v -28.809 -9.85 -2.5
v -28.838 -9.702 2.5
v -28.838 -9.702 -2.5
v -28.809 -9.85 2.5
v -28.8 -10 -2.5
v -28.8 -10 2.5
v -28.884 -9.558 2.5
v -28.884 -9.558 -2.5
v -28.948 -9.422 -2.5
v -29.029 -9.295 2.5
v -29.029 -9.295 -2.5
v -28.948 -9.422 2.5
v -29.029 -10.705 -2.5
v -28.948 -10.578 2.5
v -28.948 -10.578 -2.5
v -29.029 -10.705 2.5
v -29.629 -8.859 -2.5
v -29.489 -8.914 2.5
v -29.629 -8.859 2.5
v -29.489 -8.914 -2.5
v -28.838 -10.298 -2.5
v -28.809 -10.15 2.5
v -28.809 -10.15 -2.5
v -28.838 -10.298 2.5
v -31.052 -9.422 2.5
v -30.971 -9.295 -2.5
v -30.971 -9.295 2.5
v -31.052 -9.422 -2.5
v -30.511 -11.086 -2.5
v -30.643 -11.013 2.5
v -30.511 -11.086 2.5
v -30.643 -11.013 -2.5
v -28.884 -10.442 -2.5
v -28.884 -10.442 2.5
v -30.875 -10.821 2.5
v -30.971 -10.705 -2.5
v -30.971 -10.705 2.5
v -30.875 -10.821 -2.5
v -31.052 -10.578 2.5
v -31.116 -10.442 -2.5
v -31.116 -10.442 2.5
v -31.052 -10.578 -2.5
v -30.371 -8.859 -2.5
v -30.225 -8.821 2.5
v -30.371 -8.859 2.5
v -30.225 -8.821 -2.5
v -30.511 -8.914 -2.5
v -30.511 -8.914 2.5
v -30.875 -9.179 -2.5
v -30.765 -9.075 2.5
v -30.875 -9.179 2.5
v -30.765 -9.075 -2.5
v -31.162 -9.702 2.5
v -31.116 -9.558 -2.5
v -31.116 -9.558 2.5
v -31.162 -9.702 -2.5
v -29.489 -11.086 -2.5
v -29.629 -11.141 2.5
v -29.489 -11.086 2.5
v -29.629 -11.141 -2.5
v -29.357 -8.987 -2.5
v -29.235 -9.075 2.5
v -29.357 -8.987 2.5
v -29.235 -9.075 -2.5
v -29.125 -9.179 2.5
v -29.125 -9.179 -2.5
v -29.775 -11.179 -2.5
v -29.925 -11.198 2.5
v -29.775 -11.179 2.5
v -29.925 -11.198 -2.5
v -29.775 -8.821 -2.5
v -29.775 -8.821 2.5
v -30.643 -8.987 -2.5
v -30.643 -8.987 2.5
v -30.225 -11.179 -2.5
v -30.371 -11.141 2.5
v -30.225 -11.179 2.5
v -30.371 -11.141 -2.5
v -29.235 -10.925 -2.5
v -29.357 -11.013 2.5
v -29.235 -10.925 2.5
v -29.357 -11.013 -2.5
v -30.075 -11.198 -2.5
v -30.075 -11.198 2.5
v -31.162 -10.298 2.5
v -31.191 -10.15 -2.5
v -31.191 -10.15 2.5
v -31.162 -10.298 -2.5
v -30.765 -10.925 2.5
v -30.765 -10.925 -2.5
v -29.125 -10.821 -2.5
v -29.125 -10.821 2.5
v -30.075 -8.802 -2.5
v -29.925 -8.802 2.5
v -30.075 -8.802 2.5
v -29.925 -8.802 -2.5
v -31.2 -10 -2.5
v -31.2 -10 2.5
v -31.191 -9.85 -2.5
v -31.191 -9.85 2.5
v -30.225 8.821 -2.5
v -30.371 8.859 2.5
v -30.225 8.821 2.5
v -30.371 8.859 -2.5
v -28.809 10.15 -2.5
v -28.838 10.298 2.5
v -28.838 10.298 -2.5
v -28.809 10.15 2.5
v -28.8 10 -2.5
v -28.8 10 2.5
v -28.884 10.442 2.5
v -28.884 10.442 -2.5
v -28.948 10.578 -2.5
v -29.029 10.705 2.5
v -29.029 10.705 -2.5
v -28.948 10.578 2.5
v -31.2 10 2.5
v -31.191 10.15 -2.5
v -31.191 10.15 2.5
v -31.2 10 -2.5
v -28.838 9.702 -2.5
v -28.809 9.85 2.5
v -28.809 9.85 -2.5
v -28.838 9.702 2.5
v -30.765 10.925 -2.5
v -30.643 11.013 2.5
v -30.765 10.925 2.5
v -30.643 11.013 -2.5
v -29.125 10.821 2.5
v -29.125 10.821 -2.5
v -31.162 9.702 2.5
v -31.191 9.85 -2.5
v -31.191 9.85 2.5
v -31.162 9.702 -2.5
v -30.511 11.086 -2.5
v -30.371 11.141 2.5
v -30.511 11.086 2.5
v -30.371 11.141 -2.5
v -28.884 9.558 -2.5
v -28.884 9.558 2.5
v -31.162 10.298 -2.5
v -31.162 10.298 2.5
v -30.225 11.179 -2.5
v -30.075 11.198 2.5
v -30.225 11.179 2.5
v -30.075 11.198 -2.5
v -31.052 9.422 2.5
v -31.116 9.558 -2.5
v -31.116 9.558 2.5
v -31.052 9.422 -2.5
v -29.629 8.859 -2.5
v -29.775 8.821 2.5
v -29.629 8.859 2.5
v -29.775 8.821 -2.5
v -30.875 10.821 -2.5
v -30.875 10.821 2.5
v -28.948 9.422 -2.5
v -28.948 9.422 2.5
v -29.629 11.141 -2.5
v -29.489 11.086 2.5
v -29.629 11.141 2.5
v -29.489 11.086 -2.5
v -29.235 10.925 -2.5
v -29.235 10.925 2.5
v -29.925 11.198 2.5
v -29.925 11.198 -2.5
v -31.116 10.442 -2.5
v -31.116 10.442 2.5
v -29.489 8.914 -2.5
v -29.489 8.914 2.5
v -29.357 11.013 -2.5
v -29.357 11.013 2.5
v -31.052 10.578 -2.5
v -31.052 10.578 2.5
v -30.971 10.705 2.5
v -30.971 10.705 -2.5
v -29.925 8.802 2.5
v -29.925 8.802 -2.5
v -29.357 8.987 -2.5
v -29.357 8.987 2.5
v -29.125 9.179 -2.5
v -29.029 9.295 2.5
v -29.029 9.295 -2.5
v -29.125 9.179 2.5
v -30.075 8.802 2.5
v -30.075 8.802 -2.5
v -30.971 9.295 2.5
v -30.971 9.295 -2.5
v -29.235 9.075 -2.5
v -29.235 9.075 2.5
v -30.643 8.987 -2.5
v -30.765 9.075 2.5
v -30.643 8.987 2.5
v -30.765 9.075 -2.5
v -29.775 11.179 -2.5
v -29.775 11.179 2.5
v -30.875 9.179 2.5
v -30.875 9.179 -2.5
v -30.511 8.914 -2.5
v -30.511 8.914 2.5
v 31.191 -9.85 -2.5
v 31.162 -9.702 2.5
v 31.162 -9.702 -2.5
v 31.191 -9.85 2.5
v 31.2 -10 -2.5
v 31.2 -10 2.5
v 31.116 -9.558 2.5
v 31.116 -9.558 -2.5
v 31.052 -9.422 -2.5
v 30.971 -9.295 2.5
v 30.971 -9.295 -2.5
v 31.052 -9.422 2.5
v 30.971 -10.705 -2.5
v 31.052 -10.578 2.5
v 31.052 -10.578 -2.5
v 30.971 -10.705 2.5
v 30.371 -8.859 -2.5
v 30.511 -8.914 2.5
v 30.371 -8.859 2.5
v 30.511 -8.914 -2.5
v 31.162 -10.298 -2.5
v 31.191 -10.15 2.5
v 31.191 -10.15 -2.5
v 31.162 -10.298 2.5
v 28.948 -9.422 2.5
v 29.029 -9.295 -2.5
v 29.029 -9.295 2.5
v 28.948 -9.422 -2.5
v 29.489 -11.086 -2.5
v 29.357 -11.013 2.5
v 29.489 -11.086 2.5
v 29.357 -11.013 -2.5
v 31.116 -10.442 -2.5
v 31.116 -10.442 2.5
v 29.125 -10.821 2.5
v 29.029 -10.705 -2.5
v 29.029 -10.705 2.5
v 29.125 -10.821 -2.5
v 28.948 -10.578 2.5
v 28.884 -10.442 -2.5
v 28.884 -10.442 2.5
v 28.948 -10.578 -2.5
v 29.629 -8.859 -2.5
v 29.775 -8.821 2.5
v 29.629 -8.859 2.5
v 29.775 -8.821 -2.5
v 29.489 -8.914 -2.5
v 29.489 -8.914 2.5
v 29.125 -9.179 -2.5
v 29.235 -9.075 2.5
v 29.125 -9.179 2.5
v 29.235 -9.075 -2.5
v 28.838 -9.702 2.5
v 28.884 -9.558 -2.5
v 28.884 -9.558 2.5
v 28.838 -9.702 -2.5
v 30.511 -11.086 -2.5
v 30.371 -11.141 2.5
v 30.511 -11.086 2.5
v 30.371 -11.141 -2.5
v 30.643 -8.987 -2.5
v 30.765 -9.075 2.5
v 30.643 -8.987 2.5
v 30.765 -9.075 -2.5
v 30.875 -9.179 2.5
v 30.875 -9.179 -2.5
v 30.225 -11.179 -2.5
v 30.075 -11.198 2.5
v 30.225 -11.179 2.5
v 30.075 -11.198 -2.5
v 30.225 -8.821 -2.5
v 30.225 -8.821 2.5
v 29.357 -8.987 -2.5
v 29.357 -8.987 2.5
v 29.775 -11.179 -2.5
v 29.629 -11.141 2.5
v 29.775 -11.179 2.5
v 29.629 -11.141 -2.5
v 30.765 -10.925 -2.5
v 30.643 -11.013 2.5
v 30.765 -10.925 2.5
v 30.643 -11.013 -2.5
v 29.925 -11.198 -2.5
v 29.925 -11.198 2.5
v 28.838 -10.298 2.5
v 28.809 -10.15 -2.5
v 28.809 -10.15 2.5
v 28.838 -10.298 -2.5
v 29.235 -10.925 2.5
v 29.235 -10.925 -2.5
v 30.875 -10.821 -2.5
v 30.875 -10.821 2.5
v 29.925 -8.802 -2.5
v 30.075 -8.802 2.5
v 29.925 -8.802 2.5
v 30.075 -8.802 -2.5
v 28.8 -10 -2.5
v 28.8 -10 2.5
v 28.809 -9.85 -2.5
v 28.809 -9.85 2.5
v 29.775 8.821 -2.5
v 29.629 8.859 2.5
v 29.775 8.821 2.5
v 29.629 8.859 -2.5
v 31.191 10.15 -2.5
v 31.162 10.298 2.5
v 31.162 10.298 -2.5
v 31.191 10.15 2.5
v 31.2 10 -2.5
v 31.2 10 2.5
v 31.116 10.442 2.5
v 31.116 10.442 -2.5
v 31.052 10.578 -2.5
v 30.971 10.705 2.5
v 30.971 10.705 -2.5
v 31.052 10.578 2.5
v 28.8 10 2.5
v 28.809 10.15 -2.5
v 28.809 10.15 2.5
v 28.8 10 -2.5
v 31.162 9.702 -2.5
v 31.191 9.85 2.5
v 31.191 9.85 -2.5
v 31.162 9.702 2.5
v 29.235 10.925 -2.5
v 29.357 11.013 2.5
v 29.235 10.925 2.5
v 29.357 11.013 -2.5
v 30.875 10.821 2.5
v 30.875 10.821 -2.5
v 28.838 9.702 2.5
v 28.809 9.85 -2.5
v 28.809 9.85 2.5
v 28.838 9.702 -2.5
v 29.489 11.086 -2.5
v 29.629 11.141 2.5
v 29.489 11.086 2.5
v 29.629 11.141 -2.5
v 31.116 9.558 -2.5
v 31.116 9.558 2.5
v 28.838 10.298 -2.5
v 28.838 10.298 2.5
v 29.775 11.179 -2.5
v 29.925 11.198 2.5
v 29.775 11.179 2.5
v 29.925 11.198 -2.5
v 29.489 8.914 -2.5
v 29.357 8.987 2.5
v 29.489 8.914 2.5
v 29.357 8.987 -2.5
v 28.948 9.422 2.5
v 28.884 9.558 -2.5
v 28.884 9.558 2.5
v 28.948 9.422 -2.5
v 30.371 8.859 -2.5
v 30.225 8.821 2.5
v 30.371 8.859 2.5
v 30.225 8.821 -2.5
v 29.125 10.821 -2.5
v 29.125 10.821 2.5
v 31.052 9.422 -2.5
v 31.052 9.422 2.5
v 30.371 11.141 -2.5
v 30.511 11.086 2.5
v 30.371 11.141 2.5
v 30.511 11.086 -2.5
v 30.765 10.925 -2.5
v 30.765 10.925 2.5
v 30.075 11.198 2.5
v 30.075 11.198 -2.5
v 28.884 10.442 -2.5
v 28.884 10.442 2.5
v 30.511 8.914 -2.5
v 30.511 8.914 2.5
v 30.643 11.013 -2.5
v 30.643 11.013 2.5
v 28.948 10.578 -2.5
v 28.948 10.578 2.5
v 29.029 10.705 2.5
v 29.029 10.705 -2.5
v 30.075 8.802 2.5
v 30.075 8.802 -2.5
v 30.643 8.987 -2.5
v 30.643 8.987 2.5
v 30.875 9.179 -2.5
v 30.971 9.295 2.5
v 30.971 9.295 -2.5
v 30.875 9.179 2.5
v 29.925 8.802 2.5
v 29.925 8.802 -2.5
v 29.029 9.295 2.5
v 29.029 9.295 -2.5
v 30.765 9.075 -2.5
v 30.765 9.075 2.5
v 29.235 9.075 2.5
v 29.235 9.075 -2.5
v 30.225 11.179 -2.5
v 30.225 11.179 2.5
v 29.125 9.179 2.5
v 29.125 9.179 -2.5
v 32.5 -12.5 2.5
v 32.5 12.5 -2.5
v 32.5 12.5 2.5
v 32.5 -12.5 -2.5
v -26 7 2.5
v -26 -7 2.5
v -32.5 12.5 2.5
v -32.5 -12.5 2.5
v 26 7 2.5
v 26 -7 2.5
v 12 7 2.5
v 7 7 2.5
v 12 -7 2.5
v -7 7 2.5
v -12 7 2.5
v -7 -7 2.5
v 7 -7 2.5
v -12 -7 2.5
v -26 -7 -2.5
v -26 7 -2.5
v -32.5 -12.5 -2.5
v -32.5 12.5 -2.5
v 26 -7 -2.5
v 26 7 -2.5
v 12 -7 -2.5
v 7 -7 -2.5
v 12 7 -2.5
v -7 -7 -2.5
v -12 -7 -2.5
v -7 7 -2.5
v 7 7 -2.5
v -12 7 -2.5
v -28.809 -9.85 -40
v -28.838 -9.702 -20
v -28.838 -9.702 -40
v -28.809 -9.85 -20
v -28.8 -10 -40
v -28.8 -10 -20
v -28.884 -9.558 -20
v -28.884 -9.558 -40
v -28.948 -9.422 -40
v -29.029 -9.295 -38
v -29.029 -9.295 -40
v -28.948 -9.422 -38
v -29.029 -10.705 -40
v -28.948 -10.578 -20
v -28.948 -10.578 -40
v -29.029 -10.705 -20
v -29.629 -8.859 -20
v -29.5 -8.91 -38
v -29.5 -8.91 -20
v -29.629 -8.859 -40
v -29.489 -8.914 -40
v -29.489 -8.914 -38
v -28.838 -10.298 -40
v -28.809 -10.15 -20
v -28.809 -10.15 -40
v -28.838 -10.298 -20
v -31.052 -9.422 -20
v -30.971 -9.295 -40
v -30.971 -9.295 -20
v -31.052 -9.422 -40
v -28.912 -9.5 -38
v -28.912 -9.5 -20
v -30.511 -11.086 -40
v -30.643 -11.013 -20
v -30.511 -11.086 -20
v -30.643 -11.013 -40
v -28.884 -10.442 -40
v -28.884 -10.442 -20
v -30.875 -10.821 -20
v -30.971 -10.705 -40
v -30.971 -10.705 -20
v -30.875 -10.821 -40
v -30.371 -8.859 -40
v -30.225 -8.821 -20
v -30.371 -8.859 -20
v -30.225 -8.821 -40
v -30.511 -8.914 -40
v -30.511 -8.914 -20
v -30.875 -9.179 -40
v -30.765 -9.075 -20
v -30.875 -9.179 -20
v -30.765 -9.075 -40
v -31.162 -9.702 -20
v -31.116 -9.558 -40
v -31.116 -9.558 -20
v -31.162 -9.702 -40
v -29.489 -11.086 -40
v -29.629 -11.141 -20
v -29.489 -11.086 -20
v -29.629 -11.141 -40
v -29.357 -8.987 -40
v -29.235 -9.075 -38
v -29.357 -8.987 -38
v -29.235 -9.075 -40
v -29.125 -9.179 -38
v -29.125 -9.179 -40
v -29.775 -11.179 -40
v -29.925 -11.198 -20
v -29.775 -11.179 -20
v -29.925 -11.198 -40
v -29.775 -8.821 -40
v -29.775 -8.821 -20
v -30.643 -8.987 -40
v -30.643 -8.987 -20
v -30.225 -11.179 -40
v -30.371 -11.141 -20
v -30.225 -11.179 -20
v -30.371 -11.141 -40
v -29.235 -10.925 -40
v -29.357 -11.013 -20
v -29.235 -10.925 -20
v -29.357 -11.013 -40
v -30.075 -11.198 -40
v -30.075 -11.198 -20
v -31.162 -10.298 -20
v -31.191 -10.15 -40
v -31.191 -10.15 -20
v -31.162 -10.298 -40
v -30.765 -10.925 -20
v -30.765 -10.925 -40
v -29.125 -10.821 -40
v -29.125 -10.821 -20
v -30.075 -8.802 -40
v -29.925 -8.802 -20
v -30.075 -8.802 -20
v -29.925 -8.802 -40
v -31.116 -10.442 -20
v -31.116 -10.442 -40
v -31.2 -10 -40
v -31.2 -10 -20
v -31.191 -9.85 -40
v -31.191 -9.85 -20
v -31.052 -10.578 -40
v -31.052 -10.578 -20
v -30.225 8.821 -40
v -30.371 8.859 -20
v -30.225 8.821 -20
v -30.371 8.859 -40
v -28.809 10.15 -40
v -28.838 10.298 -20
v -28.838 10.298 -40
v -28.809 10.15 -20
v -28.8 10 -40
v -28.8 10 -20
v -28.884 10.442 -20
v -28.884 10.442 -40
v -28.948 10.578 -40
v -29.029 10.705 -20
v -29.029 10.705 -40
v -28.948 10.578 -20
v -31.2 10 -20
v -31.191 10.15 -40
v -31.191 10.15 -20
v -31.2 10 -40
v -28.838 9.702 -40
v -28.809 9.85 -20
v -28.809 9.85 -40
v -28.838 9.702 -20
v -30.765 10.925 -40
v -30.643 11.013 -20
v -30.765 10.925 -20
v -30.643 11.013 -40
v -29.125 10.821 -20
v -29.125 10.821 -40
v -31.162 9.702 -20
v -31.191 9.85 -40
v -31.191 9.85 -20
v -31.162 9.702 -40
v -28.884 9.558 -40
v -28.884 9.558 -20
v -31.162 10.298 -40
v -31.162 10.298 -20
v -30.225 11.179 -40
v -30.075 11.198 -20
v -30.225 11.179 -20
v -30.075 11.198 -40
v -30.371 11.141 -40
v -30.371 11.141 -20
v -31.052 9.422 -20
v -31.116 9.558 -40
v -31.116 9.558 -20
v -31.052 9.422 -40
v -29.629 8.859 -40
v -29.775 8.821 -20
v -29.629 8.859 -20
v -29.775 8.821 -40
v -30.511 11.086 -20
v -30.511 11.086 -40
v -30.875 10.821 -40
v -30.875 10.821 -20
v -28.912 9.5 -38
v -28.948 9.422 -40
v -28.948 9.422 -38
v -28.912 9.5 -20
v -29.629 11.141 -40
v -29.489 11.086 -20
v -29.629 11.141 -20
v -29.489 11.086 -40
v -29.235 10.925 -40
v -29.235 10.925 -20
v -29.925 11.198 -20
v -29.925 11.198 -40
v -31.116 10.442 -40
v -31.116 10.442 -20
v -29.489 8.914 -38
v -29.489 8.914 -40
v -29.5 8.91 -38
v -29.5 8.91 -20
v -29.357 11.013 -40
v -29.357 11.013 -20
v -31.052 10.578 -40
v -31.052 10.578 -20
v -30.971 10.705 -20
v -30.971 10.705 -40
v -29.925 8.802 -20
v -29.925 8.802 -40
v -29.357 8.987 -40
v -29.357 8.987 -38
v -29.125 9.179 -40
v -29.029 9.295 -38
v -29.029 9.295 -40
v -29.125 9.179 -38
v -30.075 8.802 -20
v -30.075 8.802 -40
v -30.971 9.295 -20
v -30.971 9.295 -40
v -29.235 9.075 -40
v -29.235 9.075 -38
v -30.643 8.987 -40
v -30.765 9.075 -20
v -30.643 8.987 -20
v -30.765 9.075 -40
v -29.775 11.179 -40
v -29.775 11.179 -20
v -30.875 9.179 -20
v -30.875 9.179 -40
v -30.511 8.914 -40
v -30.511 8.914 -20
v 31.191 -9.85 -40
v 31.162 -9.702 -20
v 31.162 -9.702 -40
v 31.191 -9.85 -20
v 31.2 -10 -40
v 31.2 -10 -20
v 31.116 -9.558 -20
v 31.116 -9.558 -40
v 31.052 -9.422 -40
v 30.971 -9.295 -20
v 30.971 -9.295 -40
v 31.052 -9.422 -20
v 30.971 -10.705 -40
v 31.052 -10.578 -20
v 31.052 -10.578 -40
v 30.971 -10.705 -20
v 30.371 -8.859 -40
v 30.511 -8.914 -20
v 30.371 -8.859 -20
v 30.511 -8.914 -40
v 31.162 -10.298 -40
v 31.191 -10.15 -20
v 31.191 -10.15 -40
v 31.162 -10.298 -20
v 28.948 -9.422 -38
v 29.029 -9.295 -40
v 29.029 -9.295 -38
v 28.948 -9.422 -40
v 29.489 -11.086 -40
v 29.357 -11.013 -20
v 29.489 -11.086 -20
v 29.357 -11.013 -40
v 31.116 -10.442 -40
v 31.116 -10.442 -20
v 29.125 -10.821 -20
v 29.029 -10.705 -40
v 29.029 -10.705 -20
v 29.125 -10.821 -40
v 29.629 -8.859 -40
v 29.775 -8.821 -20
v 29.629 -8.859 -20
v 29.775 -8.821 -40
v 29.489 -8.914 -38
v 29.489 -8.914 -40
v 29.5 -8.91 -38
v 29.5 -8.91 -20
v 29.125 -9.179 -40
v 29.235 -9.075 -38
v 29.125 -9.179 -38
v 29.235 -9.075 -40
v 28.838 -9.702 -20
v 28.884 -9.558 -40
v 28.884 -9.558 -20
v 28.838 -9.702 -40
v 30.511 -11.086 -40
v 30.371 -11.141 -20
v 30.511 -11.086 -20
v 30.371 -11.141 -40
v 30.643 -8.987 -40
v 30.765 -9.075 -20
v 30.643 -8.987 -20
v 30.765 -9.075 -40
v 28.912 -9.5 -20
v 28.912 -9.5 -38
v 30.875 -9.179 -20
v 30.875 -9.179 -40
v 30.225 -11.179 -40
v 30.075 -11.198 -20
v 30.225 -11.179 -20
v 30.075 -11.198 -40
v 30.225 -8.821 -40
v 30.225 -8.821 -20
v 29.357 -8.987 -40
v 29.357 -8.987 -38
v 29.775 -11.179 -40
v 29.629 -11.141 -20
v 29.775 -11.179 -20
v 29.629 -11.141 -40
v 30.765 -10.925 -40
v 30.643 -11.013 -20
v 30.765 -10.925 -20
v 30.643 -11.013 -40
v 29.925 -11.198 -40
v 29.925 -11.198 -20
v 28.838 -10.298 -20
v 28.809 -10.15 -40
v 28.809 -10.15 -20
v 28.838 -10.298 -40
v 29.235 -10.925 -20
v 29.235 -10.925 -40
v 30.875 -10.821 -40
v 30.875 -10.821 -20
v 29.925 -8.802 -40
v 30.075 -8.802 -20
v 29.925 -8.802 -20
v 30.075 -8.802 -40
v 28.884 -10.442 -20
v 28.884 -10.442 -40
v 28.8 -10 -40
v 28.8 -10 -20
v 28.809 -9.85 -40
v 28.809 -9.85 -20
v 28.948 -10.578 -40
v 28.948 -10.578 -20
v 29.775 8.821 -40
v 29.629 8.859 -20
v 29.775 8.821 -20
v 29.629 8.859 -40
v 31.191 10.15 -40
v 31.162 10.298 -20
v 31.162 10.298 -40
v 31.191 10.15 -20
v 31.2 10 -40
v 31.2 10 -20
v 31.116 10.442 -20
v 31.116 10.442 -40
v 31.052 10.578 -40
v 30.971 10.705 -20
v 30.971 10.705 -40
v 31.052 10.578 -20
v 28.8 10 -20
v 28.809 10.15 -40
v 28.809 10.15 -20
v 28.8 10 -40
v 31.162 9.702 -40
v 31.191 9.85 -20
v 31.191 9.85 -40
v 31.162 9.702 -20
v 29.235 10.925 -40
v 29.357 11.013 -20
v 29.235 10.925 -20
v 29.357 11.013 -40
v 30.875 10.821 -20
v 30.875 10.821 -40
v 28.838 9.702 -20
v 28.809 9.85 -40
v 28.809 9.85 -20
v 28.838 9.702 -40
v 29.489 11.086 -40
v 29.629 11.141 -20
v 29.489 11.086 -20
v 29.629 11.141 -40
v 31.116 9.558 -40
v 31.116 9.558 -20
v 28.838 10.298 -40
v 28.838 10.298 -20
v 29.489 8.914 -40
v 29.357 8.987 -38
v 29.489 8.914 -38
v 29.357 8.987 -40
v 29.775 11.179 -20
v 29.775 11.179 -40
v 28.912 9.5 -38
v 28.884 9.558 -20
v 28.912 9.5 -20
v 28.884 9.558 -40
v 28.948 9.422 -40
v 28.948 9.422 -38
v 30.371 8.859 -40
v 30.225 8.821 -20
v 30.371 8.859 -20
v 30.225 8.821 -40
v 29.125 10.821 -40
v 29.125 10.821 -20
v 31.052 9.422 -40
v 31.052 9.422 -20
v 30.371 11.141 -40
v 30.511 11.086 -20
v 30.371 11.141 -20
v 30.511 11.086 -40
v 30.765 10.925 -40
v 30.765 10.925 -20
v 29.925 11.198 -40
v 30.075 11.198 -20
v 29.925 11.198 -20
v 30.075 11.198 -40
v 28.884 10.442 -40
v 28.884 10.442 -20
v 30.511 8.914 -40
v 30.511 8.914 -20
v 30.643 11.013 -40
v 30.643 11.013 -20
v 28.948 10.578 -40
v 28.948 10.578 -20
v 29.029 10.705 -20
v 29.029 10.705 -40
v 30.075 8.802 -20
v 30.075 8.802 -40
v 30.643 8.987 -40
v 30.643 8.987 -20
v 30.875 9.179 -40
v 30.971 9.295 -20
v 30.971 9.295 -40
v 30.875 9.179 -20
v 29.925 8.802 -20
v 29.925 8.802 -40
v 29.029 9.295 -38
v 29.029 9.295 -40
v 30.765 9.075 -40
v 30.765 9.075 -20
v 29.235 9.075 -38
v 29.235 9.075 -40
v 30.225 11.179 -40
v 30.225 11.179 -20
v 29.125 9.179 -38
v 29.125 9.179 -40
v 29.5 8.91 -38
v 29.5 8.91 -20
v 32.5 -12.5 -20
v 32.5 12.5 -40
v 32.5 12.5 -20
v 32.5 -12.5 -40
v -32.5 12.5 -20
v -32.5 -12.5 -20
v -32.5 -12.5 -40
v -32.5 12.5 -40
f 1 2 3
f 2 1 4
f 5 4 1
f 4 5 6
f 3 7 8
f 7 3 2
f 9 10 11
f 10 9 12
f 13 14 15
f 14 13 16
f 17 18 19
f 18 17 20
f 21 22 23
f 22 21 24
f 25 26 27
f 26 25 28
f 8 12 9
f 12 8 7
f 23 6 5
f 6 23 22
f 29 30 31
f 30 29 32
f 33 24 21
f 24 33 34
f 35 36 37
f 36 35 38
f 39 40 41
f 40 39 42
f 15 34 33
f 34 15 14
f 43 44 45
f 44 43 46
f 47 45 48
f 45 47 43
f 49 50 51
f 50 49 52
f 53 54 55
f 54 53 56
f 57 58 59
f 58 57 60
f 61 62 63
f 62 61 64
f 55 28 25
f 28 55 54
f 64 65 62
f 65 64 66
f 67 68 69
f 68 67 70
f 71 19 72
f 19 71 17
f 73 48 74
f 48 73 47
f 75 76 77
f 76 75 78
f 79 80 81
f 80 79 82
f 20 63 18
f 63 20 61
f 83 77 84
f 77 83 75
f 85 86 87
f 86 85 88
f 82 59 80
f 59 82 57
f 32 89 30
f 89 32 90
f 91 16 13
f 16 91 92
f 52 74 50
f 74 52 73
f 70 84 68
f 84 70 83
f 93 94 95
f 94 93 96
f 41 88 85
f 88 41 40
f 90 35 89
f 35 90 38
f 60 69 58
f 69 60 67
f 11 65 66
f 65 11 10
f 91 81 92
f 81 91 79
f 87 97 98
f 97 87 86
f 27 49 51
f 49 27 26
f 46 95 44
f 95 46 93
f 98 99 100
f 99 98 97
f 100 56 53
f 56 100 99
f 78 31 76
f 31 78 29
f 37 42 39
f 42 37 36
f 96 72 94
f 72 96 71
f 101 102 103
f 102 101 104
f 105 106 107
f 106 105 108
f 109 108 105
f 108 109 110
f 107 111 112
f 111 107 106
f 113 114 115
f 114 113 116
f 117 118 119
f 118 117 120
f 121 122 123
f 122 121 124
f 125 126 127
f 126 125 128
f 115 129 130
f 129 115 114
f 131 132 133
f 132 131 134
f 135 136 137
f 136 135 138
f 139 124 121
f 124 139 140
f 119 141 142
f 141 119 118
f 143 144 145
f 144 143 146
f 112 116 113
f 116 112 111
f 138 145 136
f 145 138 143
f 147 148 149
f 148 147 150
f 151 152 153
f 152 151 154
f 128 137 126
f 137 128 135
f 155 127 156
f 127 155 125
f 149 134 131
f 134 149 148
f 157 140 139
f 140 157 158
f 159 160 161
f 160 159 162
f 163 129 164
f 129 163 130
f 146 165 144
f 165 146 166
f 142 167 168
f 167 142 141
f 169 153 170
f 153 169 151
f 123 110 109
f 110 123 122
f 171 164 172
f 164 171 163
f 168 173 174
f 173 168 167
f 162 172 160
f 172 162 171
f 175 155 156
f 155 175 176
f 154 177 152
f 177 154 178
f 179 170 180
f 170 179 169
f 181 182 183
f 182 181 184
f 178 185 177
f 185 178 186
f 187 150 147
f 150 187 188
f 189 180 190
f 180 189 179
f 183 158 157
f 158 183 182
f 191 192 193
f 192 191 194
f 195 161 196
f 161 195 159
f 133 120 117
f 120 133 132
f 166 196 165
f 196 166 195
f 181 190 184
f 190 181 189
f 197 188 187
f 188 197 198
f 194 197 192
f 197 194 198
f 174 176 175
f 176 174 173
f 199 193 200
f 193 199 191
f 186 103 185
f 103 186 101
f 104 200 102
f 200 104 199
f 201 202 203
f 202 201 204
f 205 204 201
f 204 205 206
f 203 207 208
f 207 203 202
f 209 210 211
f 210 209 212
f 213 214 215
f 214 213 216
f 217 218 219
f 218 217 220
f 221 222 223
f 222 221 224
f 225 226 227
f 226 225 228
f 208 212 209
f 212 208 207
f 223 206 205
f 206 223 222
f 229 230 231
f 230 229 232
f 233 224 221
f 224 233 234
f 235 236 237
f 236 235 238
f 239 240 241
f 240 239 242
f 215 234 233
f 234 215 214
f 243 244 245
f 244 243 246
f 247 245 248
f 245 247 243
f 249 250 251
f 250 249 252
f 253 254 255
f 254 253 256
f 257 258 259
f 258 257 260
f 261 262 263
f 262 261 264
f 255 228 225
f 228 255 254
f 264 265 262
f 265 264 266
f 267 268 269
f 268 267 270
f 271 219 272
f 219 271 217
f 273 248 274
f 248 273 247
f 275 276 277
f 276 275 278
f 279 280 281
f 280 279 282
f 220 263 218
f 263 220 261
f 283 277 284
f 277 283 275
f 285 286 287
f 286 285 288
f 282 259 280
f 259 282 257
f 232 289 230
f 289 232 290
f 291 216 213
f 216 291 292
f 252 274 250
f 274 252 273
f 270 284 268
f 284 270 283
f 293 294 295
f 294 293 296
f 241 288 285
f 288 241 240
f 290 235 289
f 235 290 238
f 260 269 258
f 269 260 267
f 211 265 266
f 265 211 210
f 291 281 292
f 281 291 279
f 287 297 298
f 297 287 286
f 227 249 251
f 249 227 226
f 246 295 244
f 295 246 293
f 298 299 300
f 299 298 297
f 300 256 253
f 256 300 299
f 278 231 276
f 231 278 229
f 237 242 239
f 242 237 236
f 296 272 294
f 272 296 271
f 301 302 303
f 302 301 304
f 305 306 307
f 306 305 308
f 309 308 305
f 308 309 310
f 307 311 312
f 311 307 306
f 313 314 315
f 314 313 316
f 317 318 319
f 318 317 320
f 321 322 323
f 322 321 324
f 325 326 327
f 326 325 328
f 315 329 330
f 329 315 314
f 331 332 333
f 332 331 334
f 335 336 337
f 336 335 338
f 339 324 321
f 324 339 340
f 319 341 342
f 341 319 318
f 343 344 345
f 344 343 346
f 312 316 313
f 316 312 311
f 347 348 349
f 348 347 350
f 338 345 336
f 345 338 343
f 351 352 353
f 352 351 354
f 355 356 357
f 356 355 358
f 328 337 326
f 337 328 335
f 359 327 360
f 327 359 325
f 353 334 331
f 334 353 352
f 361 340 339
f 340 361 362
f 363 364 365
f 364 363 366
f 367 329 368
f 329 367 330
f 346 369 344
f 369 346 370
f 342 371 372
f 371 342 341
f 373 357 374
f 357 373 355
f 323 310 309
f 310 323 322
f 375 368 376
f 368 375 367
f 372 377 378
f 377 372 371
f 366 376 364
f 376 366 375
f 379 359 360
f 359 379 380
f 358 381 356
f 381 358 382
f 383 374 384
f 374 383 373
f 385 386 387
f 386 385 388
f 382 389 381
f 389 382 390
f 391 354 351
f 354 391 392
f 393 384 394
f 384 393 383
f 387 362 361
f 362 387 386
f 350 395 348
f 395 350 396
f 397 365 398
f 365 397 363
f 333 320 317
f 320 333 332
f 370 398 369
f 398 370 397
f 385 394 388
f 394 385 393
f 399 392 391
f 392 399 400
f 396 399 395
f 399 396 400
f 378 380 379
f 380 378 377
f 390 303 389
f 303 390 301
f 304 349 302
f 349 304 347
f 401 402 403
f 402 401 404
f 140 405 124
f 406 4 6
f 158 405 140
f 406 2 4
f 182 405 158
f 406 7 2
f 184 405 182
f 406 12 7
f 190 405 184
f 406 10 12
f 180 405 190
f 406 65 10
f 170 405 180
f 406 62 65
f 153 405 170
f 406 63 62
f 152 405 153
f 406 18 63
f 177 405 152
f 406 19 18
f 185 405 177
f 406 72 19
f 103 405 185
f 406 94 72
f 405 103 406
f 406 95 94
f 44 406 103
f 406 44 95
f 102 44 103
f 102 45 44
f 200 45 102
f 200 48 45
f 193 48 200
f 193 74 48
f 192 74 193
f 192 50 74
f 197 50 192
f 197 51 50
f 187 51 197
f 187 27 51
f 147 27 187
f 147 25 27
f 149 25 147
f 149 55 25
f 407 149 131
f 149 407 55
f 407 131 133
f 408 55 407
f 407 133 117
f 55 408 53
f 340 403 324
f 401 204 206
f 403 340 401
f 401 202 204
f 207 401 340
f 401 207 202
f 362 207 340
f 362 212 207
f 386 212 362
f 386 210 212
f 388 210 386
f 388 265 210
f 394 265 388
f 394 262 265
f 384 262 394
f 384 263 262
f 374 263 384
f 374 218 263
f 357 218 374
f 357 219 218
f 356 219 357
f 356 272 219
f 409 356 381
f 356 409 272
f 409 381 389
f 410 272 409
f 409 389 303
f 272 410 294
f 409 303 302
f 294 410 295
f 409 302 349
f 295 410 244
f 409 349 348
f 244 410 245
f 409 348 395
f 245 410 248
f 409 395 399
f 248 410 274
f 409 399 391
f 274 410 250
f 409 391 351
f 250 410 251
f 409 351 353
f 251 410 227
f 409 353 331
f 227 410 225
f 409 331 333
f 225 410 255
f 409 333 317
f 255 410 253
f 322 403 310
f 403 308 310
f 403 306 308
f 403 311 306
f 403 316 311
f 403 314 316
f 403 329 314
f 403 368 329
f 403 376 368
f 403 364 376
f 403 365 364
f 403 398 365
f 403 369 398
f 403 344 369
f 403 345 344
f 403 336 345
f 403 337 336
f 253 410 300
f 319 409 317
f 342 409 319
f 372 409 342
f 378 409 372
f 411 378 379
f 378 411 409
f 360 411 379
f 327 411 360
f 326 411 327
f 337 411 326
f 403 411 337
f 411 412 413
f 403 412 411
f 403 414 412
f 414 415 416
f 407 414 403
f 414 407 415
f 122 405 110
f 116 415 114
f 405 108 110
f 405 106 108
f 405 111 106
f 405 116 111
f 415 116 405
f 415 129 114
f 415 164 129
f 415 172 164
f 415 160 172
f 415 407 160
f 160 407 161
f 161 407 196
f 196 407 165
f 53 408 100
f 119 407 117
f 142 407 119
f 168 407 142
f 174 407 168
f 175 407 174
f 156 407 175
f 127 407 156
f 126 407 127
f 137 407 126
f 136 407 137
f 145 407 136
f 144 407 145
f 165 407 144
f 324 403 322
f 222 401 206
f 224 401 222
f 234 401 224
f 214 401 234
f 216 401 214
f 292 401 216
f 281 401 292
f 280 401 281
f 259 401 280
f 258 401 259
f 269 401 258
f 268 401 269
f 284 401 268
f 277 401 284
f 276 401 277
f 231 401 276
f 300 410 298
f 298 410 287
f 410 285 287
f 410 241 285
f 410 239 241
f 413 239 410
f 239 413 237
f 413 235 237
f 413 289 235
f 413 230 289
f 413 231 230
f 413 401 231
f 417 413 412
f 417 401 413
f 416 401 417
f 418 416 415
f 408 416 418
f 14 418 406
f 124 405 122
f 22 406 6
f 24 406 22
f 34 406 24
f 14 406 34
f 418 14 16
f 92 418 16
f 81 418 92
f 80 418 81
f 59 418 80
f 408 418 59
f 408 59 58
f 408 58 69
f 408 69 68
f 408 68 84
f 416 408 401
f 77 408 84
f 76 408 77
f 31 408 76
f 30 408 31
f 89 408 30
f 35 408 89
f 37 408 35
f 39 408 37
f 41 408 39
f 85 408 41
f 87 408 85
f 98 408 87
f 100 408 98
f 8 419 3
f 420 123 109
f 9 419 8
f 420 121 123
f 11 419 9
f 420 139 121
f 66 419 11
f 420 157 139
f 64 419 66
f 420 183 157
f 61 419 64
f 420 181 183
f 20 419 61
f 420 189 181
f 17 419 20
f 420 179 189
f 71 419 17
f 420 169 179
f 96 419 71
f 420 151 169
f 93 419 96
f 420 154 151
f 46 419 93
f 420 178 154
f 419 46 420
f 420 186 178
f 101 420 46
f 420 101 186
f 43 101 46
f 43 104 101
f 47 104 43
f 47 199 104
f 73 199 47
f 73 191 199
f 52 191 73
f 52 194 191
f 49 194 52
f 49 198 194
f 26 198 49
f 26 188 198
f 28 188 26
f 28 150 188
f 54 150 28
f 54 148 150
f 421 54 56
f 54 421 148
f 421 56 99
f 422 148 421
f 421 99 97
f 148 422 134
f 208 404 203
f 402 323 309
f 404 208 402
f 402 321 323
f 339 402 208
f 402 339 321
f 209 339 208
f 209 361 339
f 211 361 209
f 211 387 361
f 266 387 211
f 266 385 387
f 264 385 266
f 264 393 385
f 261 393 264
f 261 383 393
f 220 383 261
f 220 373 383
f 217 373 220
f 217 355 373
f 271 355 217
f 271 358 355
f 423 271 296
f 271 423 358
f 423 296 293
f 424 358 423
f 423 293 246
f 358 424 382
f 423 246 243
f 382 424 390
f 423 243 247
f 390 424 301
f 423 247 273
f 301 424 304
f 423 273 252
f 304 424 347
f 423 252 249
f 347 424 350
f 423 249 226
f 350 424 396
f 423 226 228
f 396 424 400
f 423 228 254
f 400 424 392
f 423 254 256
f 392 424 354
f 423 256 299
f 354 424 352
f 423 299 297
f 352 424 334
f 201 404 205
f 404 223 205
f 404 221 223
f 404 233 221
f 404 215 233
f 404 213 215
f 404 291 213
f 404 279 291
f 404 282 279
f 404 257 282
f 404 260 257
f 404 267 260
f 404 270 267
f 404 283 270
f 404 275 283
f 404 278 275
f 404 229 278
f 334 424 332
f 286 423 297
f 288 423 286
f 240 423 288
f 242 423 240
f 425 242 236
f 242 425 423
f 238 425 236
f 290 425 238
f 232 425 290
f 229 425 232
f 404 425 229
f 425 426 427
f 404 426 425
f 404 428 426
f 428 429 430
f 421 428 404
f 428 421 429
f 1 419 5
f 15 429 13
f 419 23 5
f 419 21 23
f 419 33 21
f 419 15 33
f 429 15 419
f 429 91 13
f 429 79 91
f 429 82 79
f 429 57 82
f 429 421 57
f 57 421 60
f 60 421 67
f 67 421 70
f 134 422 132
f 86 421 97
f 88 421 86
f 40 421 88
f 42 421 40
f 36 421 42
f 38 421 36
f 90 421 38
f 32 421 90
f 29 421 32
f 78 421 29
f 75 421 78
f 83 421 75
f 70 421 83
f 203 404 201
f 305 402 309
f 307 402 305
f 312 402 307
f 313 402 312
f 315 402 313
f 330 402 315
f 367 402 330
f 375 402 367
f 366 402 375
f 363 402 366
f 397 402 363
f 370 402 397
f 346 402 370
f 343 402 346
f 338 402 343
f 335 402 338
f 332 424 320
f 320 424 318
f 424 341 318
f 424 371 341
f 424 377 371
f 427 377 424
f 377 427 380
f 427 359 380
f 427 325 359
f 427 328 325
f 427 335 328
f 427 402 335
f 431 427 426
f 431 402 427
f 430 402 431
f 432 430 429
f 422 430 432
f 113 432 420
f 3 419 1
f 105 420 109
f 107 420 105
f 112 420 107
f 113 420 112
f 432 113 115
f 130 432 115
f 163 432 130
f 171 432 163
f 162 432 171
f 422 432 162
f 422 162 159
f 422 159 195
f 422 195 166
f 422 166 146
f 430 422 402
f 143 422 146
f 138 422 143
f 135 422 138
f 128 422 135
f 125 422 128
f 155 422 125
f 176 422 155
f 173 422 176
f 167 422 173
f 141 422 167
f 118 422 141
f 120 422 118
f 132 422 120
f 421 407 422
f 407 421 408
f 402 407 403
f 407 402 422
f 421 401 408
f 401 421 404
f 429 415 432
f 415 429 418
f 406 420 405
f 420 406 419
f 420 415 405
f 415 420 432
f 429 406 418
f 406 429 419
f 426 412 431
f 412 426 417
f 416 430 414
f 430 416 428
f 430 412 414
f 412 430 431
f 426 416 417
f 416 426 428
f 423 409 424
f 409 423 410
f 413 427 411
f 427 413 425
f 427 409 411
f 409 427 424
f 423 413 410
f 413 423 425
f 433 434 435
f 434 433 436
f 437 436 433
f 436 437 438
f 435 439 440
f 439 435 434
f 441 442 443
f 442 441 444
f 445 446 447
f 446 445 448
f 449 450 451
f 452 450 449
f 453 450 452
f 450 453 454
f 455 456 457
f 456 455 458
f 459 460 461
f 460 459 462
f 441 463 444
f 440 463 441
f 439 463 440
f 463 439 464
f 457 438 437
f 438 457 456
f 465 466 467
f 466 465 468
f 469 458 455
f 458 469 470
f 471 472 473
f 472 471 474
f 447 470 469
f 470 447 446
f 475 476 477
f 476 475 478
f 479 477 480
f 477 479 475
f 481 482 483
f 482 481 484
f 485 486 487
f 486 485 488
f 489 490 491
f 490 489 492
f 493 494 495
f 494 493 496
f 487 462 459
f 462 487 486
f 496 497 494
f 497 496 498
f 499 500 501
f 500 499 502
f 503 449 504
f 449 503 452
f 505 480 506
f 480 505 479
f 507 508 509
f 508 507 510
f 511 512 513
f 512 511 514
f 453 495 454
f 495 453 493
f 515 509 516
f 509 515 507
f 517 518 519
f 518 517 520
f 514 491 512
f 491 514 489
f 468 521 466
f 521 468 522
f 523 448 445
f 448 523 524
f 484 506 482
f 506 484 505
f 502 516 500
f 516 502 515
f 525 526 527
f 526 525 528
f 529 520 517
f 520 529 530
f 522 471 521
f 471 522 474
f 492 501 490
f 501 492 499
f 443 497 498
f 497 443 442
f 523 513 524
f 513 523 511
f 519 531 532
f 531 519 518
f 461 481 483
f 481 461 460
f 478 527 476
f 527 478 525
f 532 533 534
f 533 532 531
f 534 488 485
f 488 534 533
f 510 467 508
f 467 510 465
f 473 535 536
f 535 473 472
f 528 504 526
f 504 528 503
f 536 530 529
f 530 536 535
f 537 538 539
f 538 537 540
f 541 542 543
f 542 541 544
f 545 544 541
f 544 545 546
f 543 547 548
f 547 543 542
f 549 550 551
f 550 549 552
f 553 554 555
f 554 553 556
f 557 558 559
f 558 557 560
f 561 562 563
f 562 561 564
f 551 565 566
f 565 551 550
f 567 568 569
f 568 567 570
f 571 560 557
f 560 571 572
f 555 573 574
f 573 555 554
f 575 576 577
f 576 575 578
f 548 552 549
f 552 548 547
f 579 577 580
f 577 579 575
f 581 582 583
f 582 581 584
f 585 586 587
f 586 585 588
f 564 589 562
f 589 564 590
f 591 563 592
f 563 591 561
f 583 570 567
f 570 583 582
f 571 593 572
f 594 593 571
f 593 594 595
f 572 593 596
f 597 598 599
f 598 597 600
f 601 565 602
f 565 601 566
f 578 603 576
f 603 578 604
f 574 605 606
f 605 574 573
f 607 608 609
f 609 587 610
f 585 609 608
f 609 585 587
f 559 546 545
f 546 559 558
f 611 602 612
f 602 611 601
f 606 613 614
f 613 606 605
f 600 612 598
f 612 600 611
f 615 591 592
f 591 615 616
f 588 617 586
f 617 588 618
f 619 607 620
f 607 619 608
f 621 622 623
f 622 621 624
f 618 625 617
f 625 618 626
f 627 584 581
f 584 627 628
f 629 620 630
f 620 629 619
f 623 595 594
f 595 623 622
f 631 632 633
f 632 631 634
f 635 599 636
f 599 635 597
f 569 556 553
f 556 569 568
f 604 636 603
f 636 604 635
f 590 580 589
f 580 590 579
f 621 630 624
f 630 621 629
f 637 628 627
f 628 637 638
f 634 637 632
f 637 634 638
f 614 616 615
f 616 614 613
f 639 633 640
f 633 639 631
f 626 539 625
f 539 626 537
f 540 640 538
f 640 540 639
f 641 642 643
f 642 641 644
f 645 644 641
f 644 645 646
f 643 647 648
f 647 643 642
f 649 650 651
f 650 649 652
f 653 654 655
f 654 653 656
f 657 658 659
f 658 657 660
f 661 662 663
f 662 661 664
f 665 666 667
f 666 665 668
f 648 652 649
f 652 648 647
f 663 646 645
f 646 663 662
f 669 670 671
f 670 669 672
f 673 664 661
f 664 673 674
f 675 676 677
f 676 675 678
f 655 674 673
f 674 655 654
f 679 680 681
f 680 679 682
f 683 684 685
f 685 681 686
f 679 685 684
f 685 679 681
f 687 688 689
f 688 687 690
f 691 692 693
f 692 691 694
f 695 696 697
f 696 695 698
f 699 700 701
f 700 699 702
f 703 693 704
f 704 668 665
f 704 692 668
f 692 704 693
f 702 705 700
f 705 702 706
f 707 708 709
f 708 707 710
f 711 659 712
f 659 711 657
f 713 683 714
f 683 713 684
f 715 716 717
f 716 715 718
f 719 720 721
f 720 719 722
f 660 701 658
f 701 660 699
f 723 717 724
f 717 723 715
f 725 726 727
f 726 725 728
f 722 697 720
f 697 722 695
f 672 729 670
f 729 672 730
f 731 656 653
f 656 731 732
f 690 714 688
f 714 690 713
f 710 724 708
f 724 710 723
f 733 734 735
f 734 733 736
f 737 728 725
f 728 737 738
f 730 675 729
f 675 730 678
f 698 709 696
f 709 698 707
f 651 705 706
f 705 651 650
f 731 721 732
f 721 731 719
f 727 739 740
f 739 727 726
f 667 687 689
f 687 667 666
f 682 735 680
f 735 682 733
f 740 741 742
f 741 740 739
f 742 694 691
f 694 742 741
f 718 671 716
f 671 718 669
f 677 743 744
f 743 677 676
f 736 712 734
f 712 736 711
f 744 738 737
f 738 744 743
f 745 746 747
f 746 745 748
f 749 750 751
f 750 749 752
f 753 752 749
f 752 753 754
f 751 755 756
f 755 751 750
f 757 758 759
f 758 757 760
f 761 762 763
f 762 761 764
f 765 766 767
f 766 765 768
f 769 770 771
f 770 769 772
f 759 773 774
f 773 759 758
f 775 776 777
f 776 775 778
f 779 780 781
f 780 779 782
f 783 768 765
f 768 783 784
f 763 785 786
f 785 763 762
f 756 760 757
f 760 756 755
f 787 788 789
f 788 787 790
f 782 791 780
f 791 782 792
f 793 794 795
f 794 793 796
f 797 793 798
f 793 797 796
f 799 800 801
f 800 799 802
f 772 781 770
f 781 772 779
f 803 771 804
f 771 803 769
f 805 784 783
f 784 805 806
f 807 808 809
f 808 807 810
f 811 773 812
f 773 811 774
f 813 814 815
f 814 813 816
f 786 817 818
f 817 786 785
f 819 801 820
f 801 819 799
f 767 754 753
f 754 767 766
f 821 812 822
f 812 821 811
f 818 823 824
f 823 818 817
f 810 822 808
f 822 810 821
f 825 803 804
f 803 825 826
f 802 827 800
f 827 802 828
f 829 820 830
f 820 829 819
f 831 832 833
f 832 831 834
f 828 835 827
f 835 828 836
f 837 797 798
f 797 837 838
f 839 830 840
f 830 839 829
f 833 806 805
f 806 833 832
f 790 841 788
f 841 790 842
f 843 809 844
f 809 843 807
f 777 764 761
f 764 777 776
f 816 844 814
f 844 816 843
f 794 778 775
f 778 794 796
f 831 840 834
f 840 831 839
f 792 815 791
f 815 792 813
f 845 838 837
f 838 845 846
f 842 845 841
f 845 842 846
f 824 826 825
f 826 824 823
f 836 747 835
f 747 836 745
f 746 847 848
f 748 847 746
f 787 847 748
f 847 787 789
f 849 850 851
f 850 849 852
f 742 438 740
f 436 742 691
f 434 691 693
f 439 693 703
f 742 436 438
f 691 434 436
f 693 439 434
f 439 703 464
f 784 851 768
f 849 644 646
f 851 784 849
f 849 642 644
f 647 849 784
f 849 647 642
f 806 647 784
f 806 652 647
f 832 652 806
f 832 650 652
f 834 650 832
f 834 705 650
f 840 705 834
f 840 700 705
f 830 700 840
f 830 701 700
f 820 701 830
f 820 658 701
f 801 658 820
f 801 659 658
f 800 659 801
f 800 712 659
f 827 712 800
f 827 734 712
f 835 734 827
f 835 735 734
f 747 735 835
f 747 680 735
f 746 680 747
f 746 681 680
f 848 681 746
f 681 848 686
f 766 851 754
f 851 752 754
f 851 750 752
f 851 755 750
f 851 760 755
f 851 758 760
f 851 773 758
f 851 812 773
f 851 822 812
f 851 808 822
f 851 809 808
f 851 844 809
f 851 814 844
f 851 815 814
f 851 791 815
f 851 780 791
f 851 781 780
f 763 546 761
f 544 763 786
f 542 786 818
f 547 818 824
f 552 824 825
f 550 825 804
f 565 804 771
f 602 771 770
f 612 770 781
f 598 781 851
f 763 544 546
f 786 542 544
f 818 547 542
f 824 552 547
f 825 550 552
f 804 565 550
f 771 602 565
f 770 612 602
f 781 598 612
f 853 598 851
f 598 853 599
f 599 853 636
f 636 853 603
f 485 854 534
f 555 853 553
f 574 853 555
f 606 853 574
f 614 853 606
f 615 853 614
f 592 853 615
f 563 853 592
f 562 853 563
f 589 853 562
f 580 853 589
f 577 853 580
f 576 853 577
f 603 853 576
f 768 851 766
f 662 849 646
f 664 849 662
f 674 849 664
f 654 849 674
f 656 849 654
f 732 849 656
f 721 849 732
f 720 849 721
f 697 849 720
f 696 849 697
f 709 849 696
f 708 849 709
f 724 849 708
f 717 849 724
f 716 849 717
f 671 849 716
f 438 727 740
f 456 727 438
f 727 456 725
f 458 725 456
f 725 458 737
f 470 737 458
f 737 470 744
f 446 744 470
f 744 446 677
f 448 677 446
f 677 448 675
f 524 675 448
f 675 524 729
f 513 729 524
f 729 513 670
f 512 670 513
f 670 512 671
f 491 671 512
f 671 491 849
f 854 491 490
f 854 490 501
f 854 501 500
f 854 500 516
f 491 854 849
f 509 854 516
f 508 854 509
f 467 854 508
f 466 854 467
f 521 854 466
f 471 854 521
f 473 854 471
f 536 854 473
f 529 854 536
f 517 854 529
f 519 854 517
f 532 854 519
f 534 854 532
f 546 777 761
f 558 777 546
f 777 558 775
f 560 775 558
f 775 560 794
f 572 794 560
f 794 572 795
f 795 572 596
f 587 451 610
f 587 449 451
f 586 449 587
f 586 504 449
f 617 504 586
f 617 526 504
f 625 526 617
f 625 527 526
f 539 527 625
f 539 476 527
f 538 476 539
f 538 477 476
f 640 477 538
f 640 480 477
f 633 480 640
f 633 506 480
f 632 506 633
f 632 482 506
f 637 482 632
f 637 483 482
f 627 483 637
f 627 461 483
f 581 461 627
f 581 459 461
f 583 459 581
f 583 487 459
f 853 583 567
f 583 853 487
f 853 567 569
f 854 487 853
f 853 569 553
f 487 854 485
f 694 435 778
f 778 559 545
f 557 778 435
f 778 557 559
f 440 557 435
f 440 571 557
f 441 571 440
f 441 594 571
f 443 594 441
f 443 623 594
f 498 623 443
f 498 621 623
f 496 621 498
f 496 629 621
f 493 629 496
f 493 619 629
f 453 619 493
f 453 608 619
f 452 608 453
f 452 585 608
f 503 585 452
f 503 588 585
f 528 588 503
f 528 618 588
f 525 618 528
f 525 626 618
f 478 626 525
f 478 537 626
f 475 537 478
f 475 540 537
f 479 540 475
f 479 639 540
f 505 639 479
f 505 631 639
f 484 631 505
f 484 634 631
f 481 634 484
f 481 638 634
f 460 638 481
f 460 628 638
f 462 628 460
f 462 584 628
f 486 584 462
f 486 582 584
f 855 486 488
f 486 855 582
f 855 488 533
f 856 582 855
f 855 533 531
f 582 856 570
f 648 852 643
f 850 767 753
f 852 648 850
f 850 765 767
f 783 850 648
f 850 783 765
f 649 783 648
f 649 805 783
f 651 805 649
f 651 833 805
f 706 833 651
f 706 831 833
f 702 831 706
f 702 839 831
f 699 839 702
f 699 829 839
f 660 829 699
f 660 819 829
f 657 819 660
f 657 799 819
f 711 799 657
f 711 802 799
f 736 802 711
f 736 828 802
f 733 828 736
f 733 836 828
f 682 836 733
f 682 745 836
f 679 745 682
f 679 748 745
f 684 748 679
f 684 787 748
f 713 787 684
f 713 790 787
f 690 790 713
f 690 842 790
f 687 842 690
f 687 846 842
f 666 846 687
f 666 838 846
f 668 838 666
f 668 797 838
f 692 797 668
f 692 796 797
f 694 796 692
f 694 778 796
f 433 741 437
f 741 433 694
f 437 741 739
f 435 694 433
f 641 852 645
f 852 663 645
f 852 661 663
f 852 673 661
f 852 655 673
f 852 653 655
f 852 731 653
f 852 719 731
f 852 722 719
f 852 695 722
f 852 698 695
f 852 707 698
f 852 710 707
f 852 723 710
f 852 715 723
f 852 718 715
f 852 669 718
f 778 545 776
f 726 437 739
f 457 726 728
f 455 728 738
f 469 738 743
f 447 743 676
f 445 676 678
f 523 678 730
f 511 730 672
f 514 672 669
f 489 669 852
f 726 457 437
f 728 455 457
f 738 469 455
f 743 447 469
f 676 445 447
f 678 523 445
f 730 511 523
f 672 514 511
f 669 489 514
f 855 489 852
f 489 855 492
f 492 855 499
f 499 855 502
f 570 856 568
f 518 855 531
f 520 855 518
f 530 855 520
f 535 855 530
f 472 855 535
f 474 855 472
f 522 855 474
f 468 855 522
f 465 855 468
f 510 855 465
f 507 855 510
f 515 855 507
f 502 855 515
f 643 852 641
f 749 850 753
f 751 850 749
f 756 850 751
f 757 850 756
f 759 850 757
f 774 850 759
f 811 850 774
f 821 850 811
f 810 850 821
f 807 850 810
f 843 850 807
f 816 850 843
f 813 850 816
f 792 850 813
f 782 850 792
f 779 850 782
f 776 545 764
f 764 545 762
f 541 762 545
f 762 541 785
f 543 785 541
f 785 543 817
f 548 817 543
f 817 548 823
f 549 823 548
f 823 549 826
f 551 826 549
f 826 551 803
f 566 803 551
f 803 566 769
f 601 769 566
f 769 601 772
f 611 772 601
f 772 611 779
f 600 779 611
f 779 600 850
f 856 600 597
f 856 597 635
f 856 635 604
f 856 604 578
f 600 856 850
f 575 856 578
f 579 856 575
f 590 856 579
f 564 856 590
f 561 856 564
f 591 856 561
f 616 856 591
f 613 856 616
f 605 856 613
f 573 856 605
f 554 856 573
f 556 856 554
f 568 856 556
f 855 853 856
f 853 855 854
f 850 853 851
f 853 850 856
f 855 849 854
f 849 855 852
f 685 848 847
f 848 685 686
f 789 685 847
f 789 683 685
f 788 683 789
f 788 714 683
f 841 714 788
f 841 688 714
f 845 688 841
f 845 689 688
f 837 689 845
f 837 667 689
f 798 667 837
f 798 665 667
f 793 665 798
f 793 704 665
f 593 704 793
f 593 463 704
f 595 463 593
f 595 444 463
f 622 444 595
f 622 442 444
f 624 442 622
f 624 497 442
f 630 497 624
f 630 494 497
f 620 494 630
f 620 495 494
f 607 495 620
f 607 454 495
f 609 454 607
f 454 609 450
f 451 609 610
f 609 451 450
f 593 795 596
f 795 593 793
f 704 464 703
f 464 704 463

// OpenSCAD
// Simple 3-key macro pad case
$fn=50;

// Parameters
switch_size = 14;       // MX switch cutout size
spacing = 19;           // center-to-center spacing
plate_thickness = 5;    // top plate thickness
case_height = 20;       // total case height
wall_thickness = 3;     // side walls
screw_hole_radius = 1.2;

// Module for switch cutouts
module switch_cutout(x) {
    translate([x, 0, 0])
        cube([switch_size, switch_size, plate_thickness+1], center=true);
}

// Top plate with cutouts + screw holes
module top_plate() {
    difference() {
        cube([65, 25, plate_thickness], center=true);

        // Switch cutouts
        switch_cutout(-spacing);
        switch_cutout(0);
        switch_cutout(spacing);

        // Screw holes
        for (x=[-30,30], y=[-10,10])
            translate([x,y,0])
                cylinder(h=plate_thickness+2, r=screw_hole_radius, center=true);
    }
}

// Bottom case with screw holes
module bottom_case() {
    difference() {
        cube([65, 25, case_height], center=true);

        // Hollow inside
        translate([0,0,2])
            cube([65-2*wall_thickness, 25-2*wall_thickness, case_height], center=true);

        // Screw holes
        for (x=[-30,30], y=[-10,10])
            translate([x,y,0])
                cylinder(h=case_height+2, r=screw_hole_radius, center=true);
    }
}

// Render both parts
translate([0,0,0]) top_plate();
translate([0,0,-case_height-10]) bottom_case();
